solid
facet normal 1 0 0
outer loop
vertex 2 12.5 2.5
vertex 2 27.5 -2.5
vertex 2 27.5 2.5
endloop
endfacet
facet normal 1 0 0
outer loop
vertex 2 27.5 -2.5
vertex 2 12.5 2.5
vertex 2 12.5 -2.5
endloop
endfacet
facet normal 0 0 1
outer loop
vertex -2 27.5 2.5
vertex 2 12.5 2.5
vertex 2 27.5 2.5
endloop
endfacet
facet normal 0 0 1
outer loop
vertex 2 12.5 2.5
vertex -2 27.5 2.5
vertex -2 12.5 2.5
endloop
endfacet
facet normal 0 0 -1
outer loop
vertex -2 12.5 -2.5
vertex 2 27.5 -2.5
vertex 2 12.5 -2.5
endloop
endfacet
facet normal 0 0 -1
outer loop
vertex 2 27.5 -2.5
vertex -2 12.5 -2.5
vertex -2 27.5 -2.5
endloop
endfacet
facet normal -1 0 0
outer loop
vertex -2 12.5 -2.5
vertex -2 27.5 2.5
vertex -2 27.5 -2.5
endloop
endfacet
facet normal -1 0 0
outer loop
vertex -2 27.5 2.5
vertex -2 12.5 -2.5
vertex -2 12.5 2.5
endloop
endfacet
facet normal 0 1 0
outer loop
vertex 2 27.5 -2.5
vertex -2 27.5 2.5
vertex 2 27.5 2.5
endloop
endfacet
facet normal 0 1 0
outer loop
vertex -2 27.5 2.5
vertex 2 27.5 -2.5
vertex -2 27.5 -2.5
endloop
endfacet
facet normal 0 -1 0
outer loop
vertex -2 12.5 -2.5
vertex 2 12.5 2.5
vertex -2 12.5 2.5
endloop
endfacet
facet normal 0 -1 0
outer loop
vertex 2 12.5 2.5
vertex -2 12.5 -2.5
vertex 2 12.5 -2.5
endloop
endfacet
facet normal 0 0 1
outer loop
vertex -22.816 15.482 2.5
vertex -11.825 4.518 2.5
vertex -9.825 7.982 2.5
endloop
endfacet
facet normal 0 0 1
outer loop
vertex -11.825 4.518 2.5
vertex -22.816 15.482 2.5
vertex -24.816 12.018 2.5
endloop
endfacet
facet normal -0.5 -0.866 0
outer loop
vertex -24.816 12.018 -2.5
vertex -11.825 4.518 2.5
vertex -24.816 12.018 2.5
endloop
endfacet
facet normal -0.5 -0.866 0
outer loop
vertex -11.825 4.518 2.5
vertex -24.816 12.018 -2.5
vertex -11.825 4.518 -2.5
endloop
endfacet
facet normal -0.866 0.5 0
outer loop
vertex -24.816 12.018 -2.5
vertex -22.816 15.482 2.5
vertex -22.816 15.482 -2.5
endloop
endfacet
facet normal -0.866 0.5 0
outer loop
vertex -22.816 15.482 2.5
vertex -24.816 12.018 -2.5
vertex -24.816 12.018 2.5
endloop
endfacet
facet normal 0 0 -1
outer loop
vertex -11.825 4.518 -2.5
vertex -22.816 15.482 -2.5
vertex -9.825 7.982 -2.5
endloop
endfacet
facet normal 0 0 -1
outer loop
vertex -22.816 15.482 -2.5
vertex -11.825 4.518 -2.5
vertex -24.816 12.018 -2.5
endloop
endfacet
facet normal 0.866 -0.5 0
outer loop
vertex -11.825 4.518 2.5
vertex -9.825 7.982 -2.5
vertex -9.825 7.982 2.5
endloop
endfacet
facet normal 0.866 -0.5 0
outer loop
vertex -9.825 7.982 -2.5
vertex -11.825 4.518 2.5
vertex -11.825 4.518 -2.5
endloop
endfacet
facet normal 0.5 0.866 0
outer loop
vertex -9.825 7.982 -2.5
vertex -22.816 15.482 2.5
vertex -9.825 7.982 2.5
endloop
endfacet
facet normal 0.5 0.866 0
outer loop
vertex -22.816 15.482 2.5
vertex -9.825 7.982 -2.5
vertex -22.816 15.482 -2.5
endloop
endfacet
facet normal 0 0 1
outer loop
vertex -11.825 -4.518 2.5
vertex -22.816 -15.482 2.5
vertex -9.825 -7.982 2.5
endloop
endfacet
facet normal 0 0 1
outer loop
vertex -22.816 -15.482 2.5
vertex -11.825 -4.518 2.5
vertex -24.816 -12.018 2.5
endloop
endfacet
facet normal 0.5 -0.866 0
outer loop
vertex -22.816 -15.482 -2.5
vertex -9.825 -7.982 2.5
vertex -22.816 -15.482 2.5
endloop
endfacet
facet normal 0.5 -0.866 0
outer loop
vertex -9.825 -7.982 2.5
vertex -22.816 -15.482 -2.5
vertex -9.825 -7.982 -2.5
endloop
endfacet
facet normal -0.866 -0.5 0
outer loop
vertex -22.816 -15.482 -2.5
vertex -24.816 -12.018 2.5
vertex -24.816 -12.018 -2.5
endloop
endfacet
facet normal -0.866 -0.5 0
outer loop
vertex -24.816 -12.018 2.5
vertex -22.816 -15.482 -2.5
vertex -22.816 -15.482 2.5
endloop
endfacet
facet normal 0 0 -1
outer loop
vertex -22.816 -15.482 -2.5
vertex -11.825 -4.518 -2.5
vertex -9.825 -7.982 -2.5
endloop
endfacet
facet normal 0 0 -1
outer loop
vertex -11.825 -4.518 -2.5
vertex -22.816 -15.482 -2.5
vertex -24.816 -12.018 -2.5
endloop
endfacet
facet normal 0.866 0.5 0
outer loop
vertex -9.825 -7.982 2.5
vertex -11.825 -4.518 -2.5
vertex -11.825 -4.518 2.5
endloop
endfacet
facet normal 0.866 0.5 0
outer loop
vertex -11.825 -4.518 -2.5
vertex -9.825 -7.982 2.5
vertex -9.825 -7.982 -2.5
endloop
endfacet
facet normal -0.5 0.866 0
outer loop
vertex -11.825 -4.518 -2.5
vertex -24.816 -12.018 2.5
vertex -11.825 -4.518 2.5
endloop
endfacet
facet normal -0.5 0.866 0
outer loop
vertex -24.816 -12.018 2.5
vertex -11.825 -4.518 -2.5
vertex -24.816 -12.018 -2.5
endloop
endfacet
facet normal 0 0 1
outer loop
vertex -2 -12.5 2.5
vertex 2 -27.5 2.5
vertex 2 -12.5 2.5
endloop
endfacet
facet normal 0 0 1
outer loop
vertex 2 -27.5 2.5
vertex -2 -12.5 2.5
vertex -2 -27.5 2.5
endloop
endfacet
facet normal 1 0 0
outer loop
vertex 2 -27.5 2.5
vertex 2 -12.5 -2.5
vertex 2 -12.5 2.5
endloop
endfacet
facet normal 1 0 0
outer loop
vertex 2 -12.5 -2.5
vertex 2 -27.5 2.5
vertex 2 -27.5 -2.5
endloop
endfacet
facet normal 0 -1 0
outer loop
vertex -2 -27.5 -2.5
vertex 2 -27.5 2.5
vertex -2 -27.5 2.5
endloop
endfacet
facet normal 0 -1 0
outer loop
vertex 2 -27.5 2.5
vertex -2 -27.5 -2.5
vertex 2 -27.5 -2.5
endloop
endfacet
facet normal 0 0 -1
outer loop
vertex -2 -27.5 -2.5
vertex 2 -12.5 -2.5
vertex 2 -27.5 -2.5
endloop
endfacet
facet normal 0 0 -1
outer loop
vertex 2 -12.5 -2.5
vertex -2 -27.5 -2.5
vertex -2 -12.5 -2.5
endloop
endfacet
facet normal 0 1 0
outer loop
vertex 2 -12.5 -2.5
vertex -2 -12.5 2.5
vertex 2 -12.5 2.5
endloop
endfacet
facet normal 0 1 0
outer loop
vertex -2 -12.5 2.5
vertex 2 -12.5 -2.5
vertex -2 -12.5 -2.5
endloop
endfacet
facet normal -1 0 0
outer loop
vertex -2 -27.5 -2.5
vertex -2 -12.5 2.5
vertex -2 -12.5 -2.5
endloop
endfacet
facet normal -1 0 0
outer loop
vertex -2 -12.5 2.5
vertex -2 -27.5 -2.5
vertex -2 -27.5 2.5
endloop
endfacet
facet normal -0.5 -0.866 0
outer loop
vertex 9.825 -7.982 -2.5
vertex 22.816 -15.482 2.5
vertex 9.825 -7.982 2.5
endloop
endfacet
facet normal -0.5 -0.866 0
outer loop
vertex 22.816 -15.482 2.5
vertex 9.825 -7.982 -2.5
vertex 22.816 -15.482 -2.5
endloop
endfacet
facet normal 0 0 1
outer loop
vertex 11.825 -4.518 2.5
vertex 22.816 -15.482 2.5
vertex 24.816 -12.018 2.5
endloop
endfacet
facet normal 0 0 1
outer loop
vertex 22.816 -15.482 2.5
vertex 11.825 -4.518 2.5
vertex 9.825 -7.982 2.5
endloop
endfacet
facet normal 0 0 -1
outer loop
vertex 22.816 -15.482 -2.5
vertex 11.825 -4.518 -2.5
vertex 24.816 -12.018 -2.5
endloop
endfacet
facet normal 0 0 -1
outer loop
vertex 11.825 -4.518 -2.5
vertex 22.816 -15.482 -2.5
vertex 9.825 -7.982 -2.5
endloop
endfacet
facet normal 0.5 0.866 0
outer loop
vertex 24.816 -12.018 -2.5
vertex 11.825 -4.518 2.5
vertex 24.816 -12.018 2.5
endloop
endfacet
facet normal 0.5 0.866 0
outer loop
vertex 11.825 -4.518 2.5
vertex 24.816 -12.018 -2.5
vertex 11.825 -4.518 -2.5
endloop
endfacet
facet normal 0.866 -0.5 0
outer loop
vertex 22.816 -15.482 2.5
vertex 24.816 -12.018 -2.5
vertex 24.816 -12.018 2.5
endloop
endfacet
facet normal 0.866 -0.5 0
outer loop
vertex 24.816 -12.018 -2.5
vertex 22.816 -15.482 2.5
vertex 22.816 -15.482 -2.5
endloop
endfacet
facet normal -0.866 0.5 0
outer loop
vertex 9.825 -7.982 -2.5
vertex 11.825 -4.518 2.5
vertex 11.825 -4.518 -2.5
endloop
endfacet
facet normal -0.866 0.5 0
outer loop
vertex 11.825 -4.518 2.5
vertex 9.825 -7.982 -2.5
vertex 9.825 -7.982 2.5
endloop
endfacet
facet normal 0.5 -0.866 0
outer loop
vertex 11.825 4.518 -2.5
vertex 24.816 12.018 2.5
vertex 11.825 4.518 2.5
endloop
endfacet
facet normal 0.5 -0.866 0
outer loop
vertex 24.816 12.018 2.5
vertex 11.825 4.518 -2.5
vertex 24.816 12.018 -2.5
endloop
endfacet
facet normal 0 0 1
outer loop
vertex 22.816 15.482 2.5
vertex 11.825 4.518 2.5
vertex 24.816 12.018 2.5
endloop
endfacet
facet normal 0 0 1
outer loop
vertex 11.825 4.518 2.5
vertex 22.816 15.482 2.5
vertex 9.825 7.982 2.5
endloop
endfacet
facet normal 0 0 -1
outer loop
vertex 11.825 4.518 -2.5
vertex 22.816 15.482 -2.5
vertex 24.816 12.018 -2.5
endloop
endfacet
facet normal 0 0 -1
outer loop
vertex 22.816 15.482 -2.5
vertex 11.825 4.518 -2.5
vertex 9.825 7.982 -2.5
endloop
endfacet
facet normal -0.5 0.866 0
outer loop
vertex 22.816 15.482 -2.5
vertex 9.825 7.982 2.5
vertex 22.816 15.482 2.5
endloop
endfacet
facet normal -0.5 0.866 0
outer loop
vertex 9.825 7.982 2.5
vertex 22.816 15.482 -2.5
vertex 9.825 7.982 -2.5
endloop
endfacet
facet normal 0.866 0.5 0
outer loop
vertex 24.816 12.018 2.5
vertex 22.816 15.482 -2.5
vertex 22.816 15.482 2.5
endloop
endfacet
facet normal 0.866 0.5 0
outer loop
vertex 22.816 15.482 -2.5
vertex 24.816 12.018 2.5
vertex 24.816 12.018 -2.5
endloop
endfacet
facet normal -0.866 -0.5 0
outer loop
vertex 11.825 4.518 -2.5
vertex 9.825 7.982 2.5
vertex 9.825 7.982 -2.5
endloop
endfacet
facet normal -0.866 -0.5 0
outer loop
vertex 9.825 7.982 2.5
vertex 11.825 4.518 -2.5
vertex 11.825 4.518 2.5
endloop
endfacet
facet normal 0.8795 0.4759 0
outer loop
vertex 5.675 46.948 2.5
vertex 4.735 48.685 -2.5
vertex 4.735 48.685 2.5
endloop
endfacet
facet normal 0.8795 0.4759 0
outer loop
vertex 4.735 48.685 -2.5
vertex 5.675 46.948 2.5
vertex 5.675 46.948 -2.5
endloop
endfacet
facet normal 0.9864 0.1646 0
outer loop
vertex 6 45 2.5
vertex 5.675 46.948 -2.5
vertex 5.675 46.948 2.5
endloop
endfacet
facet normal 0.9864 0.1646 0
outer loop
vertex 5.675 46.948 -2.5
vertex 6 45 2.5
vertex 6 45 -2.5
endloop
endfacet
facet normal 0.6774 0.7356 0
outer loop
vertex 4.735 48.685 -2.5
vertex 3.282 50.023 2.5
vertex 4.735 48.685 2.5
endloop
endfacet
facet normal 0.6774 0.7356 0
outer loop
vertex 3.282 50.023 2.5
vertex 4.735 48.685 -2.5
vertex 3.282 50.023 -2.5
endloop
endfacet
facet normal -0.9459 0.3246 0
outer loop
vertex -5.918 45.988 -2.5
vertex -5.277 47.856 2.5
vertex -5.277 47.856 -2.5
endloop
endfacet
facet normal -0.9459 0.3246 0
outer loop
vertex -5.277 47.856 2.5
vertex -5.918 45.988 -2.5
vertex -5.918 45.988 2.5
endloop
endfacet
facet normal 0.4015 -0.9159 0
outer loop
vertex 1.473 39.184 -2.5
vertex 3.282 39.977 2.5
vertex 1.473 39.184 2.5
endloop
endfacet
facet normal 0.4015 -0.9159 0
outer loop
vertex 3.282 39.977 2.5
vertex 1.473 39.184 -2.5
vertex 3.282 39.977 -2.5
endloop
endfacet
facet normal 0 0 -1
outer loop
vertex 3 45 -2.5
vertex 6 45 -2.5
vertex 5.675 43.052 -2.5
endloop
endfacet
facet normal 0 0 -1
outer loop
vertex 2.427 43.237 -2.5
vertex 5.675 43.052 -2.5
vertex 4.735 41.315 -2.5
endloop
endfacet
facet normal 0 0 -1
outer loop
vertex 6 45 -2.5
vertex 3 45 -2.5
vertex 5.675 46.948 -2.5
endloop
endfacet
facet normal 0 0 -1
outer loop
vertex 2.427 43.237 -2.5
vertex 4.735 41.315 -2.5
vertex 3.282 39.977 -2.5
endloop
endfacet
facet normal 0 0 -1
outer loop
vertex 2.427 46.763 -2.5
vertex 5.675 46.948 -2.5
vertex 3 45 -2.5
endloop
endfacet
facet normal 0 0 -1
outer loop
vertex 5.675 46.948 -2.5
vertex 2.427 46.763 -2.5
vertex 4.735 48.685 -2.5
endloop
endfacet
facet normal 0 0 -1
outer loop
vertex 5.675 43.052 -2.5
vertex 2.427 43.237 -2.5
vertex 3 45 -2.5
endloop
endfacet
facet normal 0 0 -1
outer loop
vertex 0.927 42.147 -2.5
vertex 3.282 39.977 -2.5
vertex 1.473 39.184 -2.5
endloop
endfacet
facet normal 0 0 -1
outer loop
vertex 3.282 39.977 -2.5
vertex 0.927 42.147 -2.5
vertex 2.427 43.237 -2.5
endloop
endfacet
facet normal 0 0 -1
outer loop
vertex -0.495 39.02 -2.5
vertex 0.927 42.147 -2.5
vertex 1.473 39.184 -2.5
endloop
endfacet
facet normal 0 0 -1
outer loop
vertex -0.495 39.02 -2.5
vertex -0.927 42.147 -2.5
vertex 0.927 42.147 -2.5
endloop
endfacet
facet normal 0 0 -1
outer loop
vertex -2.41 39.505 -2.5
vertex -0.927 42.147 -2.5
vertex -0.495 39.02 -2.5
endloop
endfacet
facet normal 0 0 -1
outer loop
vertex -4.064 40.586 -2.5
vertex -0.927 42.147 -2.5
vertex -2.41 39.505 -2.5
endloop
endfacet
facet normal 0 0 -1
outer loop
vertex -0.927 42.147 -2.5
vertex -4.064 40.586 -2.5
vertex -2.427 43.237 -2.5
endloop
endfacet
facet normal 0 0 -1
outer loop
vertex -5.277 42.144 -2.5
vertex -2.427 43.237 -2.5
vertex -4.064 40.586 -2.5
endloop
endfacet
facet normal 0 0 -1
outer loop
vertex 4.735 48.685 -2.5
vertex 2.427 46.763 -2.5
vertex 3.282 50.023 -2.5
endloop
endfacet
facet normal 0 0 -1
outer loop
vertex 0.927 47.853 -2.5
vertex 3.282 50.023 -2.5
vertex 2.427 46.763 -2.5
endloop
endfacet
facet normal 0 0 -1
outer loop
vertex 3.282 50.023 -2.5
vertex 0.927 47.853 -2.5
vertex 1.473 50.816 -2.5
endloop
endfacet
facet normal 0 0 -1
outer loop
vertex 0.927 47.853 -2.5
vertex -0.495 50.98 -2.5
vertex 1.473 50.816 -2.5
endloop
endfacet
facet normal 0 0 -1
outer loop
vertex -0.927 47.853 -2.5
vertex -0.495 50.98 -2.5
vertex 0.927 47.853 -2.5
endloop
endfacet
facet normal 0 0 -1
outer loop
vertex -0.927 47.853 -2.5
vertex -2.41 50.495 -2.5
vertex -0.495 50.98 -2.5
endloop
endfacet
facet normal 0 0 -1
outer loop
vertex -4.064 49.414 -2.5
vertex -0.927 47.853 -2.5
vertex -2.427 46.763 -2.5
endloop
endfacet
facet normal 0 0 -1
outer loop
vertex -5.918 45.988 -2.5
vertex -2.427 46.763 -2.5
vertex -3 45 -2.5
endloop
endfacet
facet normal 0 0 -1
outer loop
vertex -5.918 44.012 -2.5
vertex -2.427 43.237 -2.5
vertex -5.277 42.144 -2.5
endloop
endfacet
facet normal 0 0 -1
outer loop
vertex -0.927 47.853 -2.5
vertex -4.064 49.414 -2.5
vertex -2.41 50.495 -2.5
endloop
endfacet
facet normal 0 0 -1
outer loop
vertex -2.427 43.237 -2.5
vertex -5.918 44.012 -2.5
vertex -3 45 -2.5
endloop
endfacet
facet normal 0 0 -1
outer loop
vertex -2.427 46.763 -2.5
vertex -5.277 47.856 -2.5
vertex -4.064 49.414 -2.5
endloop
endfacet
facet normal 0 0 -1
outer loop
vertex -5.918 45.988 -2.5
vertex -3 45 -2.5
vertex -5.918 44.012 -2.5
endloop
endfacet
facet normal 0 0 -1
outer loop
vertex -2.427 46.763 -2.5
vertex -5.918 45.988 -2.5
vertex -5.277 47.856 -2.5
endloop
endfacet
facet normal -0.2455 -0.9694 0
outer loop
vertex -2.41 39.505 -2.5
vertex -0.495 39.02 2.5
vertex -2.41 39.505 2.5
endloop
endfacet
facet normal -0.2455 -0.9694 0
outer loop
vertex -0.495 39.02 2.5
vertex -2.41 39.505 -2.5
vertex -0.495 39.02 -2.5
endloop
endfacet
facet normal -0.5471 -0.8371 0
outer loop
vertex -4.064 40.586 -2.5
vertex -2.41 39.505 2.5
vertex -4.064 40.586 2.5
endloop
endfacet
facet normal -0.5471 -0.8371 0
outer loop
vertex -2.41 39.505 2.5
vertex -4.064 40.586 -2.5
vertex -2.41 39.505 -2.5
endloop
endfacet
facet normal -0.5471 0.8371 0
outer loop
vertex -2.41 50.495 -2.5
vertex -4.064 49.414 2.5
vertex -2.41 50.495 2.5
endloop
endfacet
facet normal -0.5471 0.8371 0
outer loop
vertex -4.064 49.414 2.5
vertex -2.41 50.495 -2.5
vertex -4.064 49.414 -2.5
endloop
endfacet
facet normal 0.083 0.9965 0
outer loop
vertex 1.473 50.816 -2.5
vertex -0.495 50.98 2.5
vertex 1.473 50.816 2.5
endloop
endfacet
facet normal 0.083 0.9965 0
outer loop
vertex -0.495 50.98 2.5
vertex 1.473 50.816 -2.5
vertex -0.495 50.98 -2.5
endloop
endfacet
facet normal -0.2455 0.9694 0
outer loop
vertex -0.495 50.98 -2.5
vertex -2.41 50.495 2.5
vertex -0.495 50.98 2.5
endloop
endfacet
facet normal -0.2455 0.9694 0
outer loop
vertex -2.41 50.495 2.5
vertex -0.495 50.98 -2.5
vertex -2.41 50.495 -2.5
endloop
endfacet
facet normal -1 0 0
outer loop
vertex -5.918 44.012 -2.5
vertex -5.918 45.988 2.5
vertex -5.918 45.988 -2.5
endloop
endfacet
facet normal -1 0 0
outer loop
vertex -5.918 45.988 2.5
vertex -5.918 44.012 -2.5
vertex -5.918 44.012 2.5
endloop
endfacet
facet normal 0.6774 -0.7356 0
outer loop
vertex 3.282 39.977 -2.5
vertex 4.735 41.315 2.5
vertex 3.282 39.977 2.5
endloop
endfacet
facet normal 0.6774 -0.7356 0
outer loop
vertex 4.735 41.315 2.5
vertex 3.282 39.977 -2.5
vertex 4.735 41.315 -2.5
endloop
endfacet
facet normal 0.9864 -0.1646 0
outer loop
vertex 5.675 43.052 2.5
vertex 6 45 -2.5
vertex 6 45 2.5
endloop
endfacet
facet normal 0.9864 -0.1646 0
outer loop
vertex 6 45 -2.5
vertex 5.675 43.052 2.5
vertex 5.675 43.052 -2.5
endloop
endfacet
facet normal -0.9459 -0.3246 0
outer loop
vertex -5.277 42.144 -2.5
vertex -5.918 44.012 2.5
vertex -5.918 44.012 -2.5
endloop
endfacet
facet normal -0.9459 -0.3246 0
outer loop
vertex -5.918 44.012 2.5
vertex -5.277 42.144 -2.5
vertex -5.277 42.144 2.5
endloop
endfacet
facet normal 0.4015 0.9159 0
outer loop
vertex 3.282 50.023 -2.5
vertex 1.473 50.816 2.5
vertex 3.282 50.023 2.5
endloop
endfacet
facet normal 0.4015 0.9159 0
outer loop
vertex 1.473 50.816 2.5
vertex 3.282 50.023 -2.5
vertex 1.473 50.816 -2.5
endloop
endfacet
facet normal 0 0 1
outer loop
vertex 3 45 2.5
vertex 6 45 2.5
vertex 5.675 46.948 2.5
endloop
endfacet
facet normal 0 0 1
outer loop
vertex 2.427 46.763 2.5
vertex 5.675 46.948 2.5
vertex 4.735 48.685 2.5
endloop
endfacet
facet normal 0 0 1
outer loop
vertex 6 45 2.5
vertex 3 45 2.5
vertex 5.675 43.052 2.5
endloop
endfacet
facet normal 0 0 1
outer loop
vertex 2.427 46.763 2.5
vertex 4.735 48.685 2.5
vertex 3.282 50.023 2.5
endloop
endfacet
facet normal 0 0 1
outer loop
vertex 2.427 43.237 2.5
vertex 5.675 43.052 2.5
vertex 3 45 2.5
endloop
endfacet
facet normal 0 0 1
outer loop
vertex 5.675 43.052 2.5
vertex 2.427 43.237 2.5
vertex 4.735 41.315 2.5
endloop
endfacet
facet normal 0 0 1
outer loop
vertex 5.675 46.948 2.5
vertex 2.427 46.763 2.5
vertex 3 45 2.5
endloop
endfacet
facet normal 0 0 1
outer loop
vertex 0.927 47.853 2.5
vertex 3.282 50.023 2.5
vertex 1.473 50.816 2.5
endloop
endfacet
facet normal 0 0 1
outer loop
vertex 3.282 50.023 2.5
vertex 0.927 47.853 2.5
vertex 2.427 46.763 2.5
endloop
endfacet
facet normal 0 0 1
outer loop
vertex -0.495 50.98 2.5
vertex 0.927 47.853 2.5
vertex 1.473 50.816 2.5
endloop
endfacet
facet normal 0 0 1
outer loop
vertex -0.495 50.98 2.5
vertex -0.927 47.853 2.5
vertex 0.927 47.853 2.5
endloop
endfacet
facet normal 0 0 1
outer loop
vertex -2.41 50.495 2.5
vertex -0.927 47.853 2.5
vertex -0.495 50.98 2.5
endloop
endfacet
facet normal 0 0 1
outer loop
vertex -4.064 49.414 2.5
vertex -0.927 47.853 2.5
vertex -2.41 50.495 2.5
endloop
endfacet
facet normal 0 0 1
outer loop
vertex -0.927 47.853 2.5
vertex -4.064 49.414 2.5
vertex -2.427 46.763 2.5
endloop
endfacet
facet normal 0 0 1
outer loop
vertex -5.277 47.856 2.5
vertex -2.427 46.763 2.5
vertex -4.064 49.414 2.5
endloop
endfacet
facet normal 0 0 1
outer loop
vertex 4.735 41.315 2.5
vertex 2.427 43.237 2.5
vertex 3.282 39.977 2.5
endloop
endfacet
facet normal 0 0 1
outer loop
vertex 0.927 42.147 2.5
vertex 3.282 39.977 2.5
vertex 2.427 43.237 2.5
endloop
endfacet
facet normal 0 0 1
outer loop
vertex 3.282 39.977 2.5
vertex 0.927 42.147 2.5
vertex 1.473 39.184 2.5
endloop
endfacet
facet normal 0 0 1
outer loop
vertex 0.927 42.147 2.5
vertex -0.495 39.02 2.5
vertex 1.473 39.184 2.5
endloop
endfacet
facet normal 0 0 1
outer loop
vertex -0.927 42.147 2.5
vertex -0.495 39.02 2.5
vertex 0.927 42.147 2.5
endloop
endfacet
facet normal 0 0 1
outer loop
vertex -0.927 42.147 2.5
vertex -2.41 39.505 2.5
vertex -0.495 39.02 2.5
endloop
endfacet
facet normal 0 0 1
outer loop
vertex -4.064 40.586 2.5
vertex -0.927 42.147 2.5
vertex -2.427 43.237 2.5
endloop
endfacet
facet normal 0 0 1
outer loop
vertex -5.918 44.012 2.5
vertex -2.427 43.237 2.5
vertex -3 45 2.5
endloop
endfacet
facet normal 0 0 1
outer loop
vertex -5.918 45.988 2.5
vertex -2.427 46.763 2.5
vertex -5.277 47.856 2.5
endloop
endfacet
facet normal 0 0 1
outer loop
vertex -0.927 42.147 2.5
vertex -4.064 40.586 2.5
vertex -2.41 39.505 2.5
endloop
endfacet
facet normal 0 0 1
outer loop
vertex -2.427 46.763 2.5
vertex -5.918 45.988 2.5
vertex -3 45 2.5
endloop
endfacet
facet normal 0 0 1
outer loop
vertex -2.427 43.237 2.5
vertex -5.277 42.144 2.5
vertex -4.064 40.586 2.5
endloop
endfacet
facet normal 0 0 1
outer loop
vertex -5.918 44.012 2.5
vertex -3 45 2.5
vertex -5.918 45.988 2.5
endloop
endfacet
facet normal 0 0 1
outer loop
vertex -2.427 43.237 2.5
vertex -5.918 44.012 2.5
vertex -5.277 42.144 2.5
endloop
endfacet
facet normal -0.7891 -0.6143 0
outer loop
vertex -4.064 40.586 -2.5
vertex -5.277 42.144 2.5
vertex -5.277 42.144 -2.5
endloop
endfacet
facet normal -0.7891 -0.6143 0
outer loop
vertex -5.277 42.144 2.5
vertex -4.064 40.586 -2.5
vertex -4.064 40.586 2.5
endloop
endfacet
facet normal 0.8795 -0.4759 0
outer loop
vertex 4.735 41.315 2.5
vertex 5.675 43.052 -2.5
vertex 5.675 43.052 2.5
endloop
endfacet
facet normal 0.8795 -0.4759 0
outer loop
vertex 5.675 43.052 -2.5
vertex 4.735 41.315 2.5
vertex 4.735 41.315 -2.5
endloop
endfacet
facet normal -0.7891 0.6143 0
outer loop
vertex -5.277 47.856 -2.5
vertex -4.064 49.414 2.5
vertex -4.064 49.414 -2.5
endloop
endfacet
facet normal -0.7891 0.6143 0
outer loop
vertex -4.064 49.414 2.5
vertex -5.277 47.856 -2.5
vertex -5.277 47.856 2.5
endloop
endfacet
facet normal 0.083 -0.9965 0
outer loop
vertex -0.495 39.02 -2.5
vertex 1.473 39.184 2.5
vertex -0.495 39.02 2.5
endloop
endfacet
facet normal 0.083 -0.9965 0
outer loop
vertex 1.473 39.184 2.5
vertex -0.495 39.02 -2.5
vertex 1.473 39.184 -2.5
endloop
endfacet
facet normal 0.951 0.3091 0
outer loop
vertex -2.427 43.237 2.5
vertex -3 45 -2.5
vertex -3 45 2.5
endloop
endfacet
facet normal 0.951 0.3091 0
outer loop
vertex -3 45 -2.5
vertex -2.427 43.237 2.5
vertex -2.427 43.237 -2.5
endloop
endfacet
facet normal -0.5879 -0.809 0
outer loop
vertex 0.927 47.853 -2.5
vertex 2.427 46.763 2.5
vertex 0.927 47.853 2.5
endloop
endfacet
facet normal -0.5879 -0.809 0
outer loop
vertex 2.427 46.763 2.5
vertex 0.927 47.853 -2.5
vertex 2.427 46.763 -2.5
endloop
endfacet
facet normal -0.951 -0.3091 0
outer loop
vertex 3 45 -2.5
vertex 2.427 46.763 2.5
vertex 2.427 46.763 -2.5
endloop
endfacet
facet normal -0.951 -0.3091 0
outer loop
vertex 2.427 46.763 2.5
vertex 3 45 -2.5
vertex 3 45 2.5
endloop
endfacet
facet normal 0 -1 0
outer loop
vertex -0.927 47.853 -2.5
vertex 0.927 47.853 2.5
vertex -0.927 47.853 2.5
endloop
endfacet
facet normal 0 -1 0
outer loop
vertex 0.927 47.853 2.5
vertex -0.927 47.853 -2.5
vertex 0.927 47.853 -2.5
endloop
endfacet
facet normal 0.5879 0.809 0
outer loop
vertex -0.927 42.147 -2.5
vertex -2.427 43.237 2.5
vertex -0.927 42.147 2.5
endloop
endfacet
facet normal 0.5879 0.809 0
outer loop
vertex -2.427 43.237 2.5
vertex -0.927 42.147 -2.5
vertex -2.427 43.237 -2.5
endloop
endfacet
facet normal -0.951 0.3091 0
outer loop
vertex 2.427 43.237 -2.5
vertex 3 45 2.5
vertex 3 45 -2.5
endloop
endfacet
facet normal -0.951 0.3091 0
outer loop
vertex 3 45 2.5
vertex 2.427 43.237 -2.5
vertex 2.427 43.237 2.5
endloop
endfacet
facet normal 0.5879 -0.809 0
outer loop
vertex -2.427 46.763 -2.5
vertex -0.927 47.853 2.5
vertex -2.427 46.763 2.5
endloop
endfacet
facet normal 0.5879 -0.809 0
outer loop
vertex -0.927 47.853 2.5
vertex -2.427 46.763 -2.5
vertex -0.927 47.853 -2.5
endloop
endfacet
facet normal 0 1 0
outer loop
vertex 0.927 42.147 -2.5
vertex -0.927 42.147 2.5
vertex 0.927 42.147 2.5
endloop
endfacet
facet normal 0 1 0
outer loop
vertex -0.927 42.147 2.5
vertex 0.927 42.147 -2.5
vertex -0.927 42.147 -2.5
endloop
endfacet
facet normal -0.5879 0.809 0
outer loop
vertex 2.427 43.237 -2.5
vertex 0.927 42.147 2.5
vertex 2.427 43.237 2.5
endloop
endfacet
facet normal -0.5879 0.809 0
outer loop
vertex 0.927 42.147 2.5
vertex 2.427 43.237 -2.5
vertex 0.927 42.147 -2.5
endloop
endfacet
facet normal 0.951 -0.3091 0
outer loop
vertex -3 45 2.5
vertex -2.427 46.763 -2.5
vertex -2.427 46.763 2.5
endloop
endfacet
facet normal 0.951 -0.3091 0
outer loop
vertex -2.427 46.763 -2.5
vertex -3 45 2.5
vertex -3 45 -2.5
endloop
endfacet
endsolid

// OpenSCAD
h = 5;
filename = "wine.dxf";
scale = 0.28;

module feature(){
		translate([0,30,0])scale([scale,scale,1])translate([0,0,-h/2])linear_extrude(height = h) import(filename);
}

module six_feature(){
	union() {
		for(i = [0:360 / 6:360]){
			rotate([0,0,i]){
				feature();
				#translate([0,20,0])cube([4,15,5], center=true);
			}
		}
	}
}

module base(){
	difference(){
		scale([0.7,0.7,1])translate([0,0,-h/2])linear_extrude(height = h) import("snowflake.dxf");
		difference(){
			translate([0,0,-2.5])cylinder(h,40,40);
			translate([0,0,-2.5])cylinder(h,20,20);
		}
	}
}


module loop() {
	translate([0,45,0]) {
		union(){
			difference() {
				cylinder(h,6,6, center = true);
				cylinder(h,3,3, center = true);
			}
			//translate([0,-10,0])cube([5,10,5], center = true);
		}
	}
}


union() {
	six_feature();
	base();
	loop();
}

//translate([0,0,-5]) color([0,1,0]) cylinder(h,40,40);
